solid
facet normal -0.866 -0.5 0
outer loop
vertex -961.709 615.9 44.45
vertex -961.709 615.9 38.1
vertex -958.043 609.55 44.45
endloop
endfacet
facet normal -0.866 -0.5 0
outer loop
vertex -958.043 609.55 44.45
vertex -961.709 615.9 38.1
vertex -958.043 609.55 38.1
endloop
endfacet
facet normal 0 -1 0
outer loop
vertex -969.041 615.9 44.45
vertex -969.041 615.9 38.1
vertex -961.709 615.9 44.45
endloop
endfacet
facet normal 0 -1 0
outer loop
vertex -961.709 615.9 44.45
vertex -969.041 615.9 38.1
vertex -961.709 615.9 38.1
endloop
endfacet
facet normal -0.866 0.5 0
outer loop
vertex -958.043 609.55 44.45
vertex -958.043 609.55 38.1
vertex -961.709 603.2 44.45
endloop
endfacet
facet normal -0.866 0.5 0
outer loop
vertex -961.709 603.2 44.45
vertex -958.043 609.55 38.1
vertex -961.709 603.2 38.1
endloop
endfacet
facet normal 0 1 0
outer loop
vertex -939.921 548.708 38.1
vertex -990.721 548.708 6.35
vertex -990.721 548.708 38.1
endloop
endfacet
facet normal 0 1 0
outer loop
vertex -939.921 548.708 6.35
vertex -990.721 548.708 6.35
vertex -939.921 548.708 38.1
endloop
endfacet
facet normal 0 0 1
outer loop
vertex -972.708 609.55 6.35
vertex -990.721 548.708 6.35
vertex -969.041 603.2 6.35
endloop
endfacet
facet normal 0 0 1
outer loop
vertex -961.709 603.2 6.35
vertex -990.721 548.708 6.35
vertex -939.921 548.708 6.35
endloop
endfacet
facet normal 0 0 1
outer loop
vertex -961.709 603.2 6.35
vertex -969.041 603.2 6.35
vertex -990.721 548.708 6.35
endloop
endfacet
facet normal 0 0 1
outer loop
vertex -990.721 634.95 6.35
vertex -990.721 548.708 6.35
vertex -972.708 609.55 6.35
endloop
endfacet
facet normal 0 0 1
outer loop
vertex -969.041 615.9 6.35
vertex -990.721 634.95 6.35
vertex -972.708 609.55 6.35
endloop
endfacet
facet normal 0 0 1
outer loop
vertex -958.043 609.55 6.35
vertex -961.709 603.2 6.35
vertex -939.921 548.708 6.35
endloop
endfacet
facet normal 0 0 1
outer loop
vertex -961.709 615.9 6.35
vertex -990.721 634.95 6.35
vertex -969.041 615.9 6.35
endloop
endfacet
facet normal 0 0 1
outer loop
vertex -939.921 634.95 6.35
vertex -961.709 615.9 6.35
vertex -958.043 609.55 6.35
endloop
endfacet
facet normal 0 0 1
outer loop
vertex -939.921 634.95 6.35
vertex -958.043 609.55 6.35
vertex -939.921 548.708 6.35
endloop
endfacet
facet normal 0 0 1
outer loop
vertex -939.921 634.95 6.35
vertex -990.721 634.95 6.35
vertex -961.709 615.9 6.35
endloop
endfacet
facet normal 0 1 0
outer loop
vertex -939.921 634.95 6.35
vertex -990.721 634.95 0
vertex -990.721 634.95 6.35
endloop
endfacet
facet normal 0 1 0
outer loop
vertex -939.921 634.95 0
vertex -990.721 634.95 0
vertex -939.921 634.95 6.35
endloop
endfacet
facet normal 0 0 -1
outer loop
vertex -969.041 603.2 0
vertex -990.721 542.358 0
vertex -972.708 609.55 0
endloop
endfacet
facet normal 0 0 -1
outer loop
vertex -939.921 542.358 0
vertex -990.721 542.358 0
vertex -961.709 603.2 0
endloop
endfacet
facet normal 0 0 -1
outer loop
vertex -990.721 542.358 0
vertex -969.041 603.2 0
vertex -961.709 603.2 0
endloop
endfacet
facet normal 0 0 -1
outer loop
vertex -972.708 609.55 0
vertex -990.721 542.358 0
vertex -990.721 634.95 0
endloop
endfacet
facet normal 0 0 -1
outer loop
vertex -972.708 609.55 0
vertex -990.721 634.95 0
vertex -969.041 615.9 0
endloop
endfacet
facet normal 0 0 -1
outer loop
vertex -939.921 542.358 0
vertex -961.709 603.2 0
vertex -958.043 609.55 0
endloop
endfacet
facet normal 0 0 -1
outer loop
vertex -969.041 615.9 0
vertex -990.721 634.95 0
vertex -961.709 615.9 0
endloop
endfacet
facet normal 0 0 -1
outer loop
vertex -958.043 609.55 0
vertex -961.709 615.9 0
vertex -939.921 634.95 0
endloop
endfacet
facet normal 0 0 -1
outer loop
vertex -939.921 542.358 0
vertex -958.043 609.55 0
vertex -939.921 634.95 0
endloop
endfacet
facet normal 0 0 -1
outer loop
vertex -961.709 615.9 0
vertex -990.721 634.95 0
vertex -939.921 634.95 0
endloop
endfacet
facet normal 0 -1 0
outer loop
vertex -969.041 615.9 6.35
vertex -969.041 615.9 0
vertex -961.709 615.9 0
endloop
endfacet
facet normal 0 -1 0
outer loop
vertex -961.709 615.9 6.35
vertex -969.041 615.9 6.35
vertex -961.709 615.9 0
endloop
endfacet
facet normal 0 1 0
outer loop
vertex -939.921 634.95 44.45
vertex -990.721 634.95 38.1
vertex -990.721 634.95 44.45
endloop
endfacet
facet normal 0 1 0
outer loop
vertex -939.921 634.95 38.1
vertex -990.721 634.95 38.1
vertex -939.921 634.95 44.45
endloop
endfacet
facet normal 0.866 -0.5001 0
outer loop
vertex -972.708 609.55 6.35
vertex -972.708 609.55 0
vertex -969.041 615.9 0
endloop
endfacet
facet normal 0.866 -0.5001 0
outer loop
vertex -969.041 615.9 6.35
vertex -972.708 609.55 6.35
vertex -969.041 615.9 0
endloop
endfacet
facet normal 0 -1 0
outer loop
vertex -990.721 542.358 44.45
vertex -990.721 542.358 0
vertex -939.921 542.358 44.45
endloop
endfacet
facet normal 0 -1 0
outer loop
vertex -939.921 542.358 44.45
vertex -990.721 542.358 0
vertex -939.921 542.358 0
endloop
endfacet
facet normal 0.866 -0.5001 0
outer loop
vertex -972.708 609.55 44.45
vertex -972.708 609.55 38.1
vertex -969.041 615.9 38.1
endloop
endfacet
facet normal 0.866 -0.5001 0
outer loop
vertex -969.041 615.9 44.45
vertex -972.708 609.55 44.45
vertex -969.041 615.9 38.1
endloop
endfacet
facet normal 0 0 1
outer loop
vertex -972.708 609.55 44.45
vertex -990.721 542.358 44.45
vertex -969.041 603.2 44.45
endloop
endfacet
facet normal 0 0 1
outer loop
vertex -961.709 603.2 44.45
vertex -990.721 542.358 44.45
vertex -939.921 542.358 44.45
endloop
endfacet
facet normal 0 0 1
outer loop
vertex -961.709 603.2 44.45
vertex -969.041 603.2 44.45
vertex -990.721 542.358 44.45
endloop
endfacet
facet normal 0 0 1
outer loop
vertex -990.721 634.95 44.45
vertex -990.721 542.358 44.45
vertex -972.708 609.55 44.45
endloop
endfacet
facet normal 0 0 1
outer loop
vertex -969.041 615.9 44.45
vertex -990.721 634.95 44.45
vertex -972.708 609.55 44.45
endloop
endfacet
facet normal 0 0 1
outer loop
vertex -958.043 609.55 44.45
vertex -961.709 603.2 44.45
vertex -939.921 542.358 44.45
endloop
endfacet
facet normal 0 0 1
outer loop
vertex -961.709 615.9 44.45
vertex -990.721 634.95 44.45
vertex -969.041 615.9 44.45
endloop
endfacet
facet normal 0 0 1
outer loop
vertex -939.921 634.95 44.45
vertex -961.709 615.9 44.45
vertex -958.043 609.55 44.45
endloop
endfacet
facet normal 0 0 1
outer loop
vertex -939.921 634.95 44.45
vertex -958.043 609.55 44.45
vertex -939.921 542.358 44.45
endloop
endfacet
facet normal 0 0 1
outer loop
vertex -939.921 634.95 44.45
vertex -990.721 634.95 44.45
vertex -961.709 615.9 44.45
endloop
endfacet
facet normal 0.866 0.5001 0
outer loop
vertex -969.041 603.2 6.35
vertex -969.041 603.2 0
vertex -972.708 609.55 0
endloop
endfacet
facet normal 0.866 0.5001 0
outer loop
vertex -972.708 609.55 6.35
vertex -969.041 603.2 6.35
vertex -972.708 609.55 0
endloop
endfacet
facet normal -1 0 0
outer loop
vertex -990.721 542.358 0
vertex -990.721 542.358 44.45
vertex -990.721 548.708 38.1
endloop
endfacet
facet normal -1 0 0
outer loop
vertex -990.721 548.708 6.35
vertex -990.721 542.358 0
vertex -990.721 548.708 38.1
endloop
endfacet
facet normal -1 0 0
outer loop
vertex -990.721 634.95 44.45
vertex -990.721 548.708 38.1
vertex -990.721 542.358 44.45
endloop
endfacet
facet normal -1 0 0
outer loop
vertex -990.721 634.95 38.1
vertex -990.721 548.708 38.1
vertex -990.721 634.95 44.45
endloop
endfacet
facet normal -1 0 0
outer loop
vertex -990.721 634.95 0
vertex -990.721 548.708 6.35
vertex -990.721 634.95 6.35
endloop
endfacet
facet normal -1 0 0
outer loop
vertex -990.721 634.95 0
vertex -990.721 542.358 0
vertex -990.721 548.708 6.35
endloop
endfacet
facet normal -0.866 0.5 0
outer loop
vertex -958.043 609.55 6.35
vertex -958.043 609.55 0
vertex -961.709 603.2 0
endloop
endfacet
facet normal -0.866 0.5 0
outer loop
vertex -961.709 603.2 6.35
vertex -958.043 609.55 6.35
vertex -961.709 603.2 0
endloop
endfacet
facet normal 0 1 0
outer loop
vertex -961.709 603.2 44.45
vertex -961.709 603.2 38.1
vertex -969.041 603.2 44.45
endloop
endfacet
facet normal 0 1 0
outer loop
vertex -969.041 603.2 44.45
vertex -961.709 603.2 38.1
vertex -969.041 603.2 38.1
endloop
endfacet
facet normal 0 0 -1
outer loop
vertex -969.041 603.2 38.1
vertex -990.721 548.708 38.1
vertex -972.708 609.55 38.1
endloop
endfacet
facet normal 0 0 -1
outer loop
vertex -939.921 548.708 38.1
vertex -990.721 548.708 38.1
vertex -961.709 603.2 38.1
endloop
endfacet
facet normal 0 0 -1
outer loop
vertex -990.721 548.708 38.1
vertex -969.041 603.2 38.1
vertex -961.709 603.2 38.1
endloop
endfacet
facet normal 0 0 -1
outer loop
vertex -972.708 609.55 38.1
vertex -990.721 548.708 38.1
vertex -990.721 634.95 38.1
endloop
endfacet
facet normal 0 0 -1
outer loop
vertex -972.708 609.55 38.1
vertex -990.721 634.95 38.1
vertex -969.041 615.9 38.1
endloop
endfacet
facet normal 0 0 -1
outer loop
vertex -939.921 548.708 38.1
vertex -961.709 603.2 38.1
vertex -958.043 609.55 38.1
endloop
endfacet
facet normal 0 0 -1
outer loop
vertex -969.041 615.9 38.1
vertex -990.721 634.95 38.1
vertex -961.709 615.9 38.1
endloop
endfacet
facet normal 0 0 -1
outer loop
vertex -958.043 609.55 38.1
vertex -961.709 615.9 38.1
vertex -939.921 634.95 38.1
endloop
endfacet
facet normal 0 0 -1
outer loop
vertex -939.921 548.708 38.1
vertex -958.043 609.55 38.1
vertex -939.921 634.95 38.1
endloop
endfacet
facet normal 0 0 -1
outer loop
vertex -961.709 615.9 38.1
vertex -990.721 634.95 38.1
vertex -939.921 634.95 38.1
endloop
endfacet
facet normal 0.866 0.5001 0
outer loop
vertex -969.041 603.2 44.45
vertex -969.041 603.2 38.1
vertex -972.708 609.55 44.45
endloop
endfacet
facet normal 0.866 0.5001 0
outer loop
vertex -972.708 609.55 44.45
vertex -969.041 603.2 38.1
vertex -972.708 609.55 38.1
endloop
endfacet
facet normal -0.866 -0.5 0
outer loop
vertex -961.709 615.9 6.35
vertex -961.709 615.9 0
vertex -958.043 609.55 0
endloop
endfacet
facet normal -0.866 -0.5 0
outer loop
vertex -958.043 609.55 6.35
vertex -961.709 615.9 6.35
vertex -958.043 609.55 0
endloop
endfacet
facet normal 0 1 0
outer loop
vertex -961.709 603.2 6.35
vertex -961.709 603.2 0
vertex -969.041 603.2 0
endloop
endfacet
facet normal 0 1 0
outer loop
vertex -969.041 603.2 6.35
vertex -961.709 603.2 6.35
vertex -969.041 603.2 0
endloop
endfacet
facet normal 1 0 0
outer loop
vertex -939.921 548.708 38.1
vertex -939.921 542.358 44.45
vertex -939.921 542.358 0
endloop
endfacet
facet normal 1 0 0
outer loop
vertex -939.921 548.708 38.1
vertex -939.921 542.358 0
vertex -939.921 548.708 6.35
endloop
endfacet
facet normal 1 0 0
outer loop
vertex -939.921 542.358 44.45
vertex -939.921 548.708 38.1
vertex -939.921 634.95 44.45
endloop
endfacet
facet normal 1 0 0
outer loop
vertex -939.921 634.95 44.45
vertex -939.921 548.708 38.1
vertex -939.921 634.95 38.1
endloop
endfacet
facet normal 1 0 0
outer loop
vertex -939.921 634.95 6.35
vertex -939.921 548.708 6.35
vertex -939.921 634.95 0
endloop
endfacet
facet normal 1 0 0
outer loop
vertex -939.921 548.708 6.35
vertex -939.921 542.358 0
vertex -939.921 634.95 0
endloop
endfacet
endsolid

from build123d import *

# Parameters (mm, degrees)
SKETCH1_W           = 50.8
SKETCH1_H           = 86.242198053
BOSS_EXTRUDE1_DEPTH = 6.35
SKETCH1_3_W         = 50.8
SKETCH1_3_H         = 6.35
BOSS_EXTRUDE2_DEPTH = 38.1
SKETCH2_W           = 50.8
SKETCH2_H           = 92.592198053
BOSS_EXTRUDE4_DEPTH = 6.35


with BuildPart() as part:
    # Sketch1 → Boss-Extrude1 (new body)
    with BuildSketch(Plane.XY):
        with Locations((-965.320655189, 591.828631034)):
            Rectangle(SKETCH1_W, SKETCH1_H)
        Polygon((-969.04135584, 603.19973006), (-972.707530049, 609.54973006), (-969.04135584, 615.89973006), (-961.709007421, 615.89973006), (-958.042833212, 609.54973006), (-961.709007421, 603.19973006), align=None, mode=Mode.SUBTRACT)
    extrude(amount=BOSS_EXTRUDE1_DEPTH)

    # Sketch1<3> → Boss-Extrude2 (add)
    with BuildSketch(Plane.XY):
        with Locations((-965.320655189, 545.532532007)):
            Rectangle(SKETCH1_3_W, SKETCH1_3_H)
    extrude(amount=BOSS_EXTRUDE2_DEPTH)

    # Sketch2 → Boss-Extrude4 (add)
    with BuildSketch(Plane.XY.offset(38.1)):
        with Locations((-965.320655189, 588.653631034)):
            Rectangle(SKETCH2_W, SKETCH2_H)
        Polygon((-958.042833212, 609.54973006), (-961.709007421, 603.19973006), (-969.04135584, 603.19973006), (-972.707530049, 609.54973006), (-969.04135584, 615.89973006), (-961.709007421, 615.89973006), align=None, mode=Mode.SUBTRACT)
    extrude(amount=BOSS_EXTRUDE4_DEPTH)


solid = part.part
